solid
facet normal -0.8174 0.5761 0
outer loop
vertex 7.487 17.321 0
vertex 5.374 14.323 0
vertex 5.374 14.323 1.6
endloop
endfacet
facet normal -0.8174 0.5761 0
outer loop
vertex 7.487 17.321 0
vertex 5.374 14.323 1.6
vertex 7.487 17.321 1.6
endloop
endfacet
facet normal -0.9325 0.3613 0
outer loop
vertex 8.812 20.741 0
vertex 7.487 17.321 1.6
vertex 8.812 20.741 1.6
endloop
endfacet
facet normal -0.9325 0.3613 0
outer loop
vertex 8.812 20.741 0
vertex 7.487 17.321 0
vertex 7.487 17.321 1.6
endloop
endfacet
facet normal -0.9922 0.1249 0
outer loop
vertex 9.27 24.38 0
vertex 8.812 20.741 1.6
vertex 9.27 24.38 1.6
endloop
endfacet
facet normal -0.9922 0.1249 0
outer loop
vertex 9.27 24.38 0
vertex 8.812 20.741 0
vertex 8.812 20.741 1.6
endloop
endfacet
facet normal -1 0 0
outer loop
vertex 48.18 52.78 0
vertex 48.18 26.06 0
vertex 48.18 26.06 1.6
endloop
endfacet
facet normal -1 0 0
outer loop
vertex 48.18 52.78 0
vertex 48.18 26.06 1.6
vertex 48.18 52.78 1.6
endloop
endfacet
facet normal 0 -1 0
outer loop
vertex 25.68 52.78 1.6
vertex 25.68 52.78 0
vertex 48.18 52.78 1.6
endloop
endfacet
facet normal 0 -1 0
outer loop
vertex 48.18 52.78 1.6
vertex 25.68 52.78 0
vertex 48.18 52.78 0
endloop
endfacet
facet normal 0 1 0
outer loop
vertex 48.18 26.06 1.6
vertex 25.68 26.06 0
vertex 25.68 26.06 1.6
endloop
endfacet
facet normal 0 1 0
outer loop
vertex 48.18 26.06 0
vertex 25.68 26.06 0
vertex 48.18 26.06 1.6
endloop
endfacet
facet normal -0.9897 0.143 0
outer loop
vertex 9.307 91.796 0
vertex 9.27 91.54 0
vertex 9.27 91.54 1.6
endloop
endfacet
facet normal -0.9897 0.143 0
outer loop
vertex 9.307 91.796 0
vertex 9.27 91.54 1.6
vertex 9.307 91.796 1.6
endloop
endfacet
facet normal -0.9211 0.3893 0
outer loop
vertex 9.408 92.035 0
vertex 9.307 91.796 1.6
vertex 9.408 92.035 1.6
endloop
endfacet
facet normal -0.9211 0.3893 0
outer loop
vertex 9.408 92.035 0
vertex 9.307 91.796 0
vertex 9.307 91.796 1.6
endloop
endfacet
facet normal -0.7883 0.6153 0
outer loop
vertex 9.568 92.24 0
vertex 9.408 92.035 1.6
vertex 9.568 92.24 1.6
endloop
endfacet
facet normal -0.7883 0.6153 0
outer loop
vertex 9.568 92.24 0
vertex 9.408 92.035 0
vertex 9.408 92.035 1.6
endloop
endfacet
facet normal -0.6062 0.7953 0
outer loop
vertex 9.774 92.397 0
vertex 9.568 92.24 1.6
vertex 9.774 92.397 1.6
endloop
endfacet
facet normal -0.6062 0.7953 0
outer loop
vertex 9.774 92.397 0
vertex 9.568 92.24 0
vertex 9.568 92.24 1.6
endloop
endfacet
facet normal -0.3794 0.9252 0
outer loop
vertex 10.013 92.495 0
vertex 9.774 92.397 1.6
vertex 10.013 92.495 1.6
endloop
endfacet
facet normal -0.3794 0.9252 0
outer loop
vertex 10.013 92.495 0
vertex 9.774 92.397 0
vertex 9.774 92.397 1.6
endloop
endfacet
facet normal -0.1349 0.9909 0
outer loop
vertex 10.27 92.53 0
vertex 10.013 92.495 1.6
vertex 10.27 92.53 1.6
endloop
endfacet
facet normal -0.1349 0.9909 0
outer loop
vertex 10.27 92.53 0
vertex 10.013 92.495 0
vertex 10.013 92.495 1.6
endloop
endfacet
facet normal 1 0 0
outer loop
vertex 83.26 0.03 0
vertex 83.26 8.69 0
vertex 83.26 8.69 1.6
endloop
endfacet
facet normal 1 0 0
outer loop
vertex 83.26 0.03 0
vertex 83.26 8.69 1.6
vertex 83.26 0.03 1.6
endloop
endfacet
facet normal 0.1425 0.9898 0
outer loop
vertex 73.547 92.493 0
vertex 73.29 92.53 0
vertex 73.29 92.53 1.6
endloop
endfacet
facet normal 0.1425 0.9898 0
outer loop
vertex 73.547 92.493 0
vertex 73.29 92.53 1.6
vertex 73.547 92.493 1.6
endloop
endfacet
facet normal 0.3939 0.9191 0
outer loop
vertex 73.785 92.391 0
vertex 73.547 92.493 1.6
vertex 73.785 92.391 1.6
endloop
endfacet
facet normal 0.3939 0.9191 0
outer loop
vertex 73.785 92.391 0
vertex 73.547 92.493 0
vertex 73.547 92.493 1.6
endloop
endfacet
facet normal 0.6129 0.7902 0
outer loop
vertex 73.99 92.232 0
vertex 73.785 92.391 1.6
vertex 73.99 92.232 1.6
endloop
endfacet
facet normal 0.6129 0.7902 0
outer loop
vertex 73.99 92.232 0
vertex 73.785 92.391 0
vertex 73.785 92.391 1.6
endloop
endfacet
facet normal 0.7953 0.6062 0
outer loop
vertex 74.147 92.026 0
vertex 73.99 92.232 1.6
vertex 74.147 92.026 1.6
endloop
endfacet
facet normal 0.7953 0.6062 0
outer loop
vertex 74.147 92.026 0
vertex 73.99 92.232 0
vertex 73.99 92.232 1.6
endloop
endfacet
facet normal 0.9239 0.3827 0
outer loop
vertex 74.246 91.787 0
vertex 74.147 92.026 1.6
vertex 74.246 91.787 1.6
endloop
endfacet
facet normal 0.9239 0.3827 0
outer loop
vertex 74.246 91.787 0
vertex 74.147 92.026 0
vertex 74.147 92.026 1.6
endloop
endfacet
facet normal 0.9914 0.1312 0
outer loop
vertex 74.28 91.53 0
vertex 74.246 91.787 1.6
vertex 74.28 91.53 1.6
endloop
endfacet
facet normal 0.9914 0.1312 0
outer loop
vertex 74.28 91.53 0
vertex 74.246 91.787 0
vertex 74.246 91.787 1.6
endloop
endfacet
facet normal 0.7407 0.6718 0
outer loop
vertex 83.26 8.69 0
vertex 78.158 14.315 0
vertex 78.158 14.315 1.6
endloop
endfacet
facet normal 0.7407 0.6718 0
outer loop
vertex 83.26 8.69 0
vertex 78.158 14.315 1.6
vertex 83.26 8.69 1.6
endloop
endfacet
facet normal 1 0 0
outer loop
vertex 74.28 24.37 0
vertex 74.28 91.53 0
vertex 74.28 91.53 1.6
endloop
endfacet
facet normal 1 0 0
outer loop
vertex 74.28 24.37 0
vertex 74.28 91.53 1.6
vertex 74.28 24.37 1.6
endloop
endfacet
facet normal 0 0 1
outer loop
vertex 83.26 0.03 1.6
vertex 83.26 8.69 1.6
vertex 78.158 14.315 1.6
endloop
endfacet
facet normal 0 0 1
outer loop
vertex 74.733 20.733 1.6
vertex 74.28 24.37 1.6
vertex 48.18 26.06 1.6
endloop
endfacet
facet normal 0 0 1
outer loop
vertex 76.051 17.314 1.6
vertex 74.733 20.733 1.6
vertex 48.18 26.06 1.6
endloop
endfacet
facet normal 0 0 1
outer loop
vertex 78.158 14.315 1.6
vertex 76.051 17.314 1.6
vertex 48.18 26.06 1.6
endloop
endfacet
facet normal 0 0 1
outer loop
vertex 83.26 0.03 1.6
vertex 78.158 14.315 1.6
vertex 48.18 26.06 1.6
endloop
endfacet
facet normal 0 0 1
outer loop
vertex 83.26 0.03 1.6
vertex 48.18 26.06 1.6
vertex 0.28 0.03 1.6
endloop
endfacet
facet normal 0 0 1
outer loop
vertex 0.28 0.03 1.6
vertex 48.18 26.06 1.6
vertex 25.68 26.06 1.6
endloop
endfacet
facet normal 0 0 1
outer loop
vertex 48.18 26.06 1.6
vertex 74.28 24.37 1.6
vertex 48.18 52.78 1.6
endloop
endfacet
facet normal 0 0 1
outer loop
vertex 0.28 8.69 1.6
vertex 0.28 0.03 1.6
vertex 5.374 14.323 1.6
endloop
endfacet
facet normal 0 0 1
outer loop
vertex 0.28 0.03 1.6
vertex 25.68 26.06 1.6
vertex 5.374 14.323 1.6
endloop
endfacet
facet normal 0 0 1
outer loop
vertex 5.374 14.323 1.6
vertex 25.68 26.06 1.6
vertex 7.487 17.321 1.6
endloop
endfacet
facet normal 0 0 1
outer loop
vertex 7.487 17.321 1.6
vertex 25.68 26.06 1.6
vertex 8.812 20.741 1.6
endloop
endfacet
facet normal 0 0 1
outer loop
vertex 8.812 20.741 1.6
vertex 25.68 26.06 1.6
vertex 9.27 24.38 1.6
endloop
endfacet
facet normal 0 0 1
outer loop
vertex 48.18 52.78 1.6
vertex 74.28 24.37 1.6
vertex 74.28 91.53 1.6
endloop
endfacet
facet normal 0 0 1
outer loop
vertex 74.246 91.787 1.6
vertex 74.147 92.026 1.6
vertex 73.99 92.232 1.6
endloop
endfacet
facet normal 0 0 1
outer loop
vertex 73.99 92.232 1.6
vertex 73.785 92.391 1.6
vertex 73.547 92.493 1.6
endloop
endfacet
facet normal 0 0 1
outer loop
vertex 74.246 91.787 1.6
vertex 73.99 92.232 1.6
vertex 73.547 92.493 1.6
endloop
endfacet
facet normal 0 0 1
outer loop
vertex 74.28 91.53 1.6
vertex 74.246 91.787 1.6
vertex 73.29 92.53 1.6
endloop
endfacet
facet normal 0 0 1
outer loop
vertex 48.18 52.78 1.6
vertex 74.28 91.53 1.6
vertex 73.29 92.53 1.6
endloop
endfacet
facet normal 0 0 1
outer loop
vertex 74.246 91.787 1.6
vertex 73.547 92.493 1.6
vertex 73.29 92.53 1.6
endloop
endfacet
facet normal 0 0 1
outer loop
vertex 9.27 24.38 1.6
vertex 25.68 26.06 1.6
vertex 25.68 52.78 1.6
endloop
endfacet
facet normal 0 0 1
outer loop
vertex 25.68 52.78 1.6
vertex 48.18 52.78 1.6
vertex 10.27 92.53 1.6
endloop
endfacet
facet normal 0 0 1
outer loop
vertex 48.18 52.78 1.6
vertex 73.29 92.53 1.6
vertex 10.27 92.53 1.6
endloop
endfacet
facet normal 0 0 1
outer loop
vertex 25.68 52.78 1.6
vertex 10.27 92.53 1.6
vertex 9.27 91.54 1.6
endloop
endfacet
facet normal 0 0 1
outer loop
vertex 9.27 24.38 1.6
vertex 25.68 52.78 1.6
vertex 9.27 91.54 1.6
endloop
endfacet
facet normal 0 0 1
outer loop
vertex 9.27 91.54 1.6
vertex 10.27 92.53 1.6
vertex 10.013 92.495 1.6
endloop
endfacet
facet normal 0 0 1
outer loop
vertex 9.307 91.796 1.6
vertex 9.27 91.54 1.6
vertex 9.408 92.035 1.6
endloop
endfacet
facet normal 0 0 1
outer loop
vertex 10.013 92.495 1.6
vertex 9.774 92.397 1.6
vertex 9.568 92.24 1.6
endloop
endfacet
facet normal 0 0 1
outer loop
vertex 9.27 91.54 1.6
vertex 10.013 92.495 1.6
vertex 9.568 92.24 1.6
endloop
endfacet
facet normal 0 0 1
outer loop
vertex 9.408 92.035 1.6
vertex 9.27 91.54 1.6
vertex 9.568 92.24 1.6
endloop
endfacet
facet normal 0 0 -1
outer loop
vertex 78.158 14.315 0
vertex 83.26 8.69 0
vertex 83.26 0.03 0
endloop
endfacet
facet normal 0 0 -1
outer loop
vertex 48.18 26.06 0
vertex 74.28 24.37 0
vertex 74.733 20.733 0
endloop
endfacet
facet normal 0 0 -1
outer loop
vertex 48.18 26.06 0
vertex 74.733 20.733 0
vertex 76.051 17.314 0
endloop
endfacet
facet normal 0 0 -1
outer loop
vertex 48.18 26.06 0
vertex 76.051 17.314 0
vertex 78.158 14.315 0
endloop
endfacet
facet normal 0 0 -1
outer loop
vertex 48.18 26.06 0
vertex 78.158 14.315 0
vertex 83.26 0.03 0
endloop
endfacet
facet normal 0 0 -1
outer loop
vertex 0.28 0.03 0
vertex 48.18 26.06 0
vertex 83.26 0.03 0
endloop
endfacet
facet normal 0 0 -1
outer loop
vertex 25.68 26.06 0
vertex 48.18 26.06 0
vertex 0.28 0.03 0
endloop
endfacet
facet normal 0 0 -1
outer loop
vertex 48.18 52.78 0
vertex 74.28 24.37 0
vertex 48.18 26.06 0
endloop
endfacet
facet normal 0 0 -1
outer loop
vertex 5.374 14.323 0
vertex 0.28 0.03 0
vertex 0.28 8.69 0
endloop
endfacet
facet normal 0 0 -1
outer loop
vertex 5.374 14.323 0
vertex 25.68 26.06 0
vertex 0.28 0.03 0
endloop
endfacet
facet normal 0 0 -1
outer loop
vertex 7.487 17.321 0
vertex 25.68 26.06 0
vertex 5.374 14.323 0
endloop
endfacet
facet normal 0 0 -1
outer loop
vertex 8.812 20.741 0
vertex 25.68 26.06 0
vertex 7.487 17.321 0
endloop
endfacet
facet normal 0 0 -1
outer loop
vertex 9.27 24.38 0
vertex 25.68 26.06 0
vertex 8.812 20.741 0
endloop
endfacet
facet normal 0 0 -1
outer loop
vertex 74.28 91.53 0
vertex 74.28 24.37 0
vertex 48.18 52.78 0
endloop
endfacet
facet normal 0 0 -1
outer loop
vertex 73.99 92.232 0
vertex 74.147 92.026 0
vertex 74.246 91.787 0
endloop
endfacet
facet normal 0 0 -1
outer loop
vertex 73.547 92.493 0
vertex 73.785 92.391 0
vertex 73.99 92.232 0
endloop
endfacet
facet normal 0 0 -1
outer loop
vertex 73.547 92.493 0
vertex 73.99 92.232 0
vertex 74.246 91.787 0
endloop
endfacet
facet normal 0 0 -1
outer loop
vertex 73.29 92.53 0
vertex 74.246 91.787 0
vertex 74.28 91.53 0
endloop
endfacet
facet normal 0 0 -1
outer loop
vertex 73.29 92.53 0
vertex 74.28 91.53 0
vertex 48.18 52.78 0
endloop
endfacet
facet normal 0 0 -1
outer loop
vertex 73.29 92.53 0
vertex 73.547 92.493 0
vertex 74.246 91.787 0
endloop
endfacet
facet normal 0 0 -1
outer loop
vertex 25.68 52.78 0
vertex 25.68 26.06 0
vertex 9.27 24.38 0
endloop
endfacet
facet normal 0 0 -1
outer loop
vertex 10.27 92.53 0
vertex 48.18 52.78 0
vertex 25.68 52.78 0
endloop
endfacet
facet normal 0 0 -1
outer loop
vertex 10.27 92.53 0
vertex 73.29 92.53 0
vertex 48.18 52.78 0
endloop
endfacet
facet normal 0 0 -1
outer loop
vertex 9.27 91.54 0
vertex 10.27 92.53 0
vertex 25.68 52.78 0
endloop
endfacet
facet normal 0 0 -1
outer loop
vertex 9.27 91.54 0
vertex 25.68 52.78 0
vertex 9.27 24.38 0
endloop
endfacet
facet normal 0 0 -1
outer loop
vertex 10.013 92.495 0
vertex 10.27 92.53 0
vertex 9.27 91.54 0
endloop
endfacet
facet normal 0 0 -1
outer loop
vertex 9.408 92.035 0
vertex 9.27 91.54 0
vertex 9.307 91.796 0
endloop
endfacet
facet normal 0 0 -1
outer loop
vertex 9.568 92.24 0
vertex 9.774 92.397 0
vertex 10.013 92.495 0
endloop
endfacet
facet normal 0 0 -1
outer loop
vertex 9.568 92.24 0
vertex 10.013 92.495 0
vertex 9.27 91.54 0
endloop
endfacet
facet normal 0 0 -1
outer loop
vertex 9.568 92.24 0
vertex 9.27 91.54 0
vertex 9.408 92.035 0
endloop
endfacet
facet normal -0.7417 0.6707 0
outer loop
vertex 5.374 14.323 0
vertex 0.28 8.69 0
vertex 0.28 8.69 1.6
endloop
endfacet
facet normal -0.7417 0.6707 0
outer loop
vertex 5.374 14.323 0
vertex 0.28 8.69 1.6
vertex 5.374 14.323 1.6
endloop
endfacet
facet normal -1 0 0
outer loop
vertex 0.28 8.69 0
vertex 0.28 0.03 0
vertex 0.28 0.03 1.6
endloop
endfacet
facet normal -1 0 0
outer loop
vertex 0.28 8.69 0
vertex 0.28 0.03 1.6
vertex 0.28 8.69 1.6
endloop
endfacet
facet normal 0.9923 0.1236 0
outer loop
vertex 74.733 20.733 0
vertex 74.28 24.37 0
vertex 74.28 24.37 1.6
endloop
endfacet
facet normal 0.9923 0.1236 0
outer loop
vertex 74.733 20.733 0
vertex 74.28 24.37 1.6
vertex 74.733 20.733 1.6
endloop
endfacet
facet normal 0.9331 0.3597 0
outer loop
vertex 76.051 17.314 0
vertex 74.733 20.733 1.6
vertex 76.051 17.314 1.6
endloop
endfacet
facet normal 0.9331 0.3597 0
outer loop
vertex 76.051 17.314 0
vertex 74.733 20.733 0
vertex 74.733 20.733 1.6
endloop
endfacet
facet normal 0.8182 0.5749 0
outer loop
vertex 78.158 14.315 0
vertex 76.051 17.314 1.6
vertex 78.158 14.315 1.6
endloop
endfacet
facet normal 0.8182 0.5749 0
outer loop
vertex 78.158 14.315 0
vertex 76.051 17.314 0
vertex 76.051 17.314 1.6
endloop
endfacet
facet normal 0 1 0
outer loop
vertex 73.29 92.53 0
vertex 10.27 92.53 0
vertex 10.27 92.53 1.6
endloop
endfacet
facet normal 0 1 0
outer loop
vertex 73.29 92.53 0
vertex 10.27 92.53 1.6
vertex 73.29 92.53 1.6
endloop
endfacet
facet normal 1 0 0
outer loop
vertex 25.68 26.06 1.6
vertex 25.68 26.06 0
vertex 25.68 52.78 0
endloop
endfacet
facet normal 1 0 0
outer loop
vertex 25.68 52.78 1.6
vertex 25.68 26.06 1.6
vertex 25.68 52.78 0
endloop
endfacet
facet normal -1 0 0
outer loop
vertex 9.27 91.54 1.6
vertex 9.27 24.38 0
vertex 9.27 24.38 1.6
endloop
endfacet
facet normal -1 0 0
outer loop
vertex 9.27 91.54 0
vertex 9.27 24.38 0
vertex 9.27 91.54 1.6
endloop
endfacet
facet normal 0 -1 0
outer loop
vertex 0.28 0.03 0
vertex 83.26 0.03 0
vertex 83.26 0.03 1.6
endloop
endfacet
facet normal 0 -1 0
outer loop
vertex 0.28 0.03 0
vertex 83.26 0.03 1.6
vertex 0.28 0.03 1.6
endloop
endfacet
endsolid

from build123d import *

# Parameters (mm, degrees)
BOARD_W             = 22.5
BOARD_H             = 26.72
BOSS_EXTRUDE2_DEPTH = 1.6


with BuildPart() as part:
    # BOARD → Boss-Extrude2 (new body)
    with BuildSketch(Plane.XY):
        with BuildLine():
            Line((78.158087673, 14.315192257), (83.26046847, 8.69))
            Line((83.26046847, 8.69), (83.26046847, 0.03))
            Line((83.26046847, 0.03), (0.28, 0.03))
            Line((0.28, 0.03), (0.28, 8.69))
            Line((0.28, 8.69), (5.37370372, 14.323050696))
            ThreePointArc((5.37370372, 14.323050696), (8.254635545, 18.990143234), (9.27, 24.38))
            Line((9.27, 24.38), (9.27, 91.540000744))
            ThreePointArc((9.27, 91.540000744), (9.567594313, 92.239511842), (10.270147398, 92.529851835))
            Line((10.270147398, 92.529851835), (73.290147398, 92.529851835))
            ThreePointArc((73.290147398, 92.529851835), (73.989702799, 92.232361682), (74.280147398, 91.529851835))
            Line((74.280147398, 91.529851835), (74.280147398, 24.369851835))
            ThreePointArc((74.280147398, 24.369851835), (75.287357034, 18.983155173), (78.158087673, 14.315192257))
        make_face()
        with Locations((36.93, 39.42)):
            Rectangle(BOARD_W, BOARD_H, mode=Mode.SUBTRACT)
    extrude(amount=BOSS_EXTRUDE2_DEPTH)


solid = part.part
